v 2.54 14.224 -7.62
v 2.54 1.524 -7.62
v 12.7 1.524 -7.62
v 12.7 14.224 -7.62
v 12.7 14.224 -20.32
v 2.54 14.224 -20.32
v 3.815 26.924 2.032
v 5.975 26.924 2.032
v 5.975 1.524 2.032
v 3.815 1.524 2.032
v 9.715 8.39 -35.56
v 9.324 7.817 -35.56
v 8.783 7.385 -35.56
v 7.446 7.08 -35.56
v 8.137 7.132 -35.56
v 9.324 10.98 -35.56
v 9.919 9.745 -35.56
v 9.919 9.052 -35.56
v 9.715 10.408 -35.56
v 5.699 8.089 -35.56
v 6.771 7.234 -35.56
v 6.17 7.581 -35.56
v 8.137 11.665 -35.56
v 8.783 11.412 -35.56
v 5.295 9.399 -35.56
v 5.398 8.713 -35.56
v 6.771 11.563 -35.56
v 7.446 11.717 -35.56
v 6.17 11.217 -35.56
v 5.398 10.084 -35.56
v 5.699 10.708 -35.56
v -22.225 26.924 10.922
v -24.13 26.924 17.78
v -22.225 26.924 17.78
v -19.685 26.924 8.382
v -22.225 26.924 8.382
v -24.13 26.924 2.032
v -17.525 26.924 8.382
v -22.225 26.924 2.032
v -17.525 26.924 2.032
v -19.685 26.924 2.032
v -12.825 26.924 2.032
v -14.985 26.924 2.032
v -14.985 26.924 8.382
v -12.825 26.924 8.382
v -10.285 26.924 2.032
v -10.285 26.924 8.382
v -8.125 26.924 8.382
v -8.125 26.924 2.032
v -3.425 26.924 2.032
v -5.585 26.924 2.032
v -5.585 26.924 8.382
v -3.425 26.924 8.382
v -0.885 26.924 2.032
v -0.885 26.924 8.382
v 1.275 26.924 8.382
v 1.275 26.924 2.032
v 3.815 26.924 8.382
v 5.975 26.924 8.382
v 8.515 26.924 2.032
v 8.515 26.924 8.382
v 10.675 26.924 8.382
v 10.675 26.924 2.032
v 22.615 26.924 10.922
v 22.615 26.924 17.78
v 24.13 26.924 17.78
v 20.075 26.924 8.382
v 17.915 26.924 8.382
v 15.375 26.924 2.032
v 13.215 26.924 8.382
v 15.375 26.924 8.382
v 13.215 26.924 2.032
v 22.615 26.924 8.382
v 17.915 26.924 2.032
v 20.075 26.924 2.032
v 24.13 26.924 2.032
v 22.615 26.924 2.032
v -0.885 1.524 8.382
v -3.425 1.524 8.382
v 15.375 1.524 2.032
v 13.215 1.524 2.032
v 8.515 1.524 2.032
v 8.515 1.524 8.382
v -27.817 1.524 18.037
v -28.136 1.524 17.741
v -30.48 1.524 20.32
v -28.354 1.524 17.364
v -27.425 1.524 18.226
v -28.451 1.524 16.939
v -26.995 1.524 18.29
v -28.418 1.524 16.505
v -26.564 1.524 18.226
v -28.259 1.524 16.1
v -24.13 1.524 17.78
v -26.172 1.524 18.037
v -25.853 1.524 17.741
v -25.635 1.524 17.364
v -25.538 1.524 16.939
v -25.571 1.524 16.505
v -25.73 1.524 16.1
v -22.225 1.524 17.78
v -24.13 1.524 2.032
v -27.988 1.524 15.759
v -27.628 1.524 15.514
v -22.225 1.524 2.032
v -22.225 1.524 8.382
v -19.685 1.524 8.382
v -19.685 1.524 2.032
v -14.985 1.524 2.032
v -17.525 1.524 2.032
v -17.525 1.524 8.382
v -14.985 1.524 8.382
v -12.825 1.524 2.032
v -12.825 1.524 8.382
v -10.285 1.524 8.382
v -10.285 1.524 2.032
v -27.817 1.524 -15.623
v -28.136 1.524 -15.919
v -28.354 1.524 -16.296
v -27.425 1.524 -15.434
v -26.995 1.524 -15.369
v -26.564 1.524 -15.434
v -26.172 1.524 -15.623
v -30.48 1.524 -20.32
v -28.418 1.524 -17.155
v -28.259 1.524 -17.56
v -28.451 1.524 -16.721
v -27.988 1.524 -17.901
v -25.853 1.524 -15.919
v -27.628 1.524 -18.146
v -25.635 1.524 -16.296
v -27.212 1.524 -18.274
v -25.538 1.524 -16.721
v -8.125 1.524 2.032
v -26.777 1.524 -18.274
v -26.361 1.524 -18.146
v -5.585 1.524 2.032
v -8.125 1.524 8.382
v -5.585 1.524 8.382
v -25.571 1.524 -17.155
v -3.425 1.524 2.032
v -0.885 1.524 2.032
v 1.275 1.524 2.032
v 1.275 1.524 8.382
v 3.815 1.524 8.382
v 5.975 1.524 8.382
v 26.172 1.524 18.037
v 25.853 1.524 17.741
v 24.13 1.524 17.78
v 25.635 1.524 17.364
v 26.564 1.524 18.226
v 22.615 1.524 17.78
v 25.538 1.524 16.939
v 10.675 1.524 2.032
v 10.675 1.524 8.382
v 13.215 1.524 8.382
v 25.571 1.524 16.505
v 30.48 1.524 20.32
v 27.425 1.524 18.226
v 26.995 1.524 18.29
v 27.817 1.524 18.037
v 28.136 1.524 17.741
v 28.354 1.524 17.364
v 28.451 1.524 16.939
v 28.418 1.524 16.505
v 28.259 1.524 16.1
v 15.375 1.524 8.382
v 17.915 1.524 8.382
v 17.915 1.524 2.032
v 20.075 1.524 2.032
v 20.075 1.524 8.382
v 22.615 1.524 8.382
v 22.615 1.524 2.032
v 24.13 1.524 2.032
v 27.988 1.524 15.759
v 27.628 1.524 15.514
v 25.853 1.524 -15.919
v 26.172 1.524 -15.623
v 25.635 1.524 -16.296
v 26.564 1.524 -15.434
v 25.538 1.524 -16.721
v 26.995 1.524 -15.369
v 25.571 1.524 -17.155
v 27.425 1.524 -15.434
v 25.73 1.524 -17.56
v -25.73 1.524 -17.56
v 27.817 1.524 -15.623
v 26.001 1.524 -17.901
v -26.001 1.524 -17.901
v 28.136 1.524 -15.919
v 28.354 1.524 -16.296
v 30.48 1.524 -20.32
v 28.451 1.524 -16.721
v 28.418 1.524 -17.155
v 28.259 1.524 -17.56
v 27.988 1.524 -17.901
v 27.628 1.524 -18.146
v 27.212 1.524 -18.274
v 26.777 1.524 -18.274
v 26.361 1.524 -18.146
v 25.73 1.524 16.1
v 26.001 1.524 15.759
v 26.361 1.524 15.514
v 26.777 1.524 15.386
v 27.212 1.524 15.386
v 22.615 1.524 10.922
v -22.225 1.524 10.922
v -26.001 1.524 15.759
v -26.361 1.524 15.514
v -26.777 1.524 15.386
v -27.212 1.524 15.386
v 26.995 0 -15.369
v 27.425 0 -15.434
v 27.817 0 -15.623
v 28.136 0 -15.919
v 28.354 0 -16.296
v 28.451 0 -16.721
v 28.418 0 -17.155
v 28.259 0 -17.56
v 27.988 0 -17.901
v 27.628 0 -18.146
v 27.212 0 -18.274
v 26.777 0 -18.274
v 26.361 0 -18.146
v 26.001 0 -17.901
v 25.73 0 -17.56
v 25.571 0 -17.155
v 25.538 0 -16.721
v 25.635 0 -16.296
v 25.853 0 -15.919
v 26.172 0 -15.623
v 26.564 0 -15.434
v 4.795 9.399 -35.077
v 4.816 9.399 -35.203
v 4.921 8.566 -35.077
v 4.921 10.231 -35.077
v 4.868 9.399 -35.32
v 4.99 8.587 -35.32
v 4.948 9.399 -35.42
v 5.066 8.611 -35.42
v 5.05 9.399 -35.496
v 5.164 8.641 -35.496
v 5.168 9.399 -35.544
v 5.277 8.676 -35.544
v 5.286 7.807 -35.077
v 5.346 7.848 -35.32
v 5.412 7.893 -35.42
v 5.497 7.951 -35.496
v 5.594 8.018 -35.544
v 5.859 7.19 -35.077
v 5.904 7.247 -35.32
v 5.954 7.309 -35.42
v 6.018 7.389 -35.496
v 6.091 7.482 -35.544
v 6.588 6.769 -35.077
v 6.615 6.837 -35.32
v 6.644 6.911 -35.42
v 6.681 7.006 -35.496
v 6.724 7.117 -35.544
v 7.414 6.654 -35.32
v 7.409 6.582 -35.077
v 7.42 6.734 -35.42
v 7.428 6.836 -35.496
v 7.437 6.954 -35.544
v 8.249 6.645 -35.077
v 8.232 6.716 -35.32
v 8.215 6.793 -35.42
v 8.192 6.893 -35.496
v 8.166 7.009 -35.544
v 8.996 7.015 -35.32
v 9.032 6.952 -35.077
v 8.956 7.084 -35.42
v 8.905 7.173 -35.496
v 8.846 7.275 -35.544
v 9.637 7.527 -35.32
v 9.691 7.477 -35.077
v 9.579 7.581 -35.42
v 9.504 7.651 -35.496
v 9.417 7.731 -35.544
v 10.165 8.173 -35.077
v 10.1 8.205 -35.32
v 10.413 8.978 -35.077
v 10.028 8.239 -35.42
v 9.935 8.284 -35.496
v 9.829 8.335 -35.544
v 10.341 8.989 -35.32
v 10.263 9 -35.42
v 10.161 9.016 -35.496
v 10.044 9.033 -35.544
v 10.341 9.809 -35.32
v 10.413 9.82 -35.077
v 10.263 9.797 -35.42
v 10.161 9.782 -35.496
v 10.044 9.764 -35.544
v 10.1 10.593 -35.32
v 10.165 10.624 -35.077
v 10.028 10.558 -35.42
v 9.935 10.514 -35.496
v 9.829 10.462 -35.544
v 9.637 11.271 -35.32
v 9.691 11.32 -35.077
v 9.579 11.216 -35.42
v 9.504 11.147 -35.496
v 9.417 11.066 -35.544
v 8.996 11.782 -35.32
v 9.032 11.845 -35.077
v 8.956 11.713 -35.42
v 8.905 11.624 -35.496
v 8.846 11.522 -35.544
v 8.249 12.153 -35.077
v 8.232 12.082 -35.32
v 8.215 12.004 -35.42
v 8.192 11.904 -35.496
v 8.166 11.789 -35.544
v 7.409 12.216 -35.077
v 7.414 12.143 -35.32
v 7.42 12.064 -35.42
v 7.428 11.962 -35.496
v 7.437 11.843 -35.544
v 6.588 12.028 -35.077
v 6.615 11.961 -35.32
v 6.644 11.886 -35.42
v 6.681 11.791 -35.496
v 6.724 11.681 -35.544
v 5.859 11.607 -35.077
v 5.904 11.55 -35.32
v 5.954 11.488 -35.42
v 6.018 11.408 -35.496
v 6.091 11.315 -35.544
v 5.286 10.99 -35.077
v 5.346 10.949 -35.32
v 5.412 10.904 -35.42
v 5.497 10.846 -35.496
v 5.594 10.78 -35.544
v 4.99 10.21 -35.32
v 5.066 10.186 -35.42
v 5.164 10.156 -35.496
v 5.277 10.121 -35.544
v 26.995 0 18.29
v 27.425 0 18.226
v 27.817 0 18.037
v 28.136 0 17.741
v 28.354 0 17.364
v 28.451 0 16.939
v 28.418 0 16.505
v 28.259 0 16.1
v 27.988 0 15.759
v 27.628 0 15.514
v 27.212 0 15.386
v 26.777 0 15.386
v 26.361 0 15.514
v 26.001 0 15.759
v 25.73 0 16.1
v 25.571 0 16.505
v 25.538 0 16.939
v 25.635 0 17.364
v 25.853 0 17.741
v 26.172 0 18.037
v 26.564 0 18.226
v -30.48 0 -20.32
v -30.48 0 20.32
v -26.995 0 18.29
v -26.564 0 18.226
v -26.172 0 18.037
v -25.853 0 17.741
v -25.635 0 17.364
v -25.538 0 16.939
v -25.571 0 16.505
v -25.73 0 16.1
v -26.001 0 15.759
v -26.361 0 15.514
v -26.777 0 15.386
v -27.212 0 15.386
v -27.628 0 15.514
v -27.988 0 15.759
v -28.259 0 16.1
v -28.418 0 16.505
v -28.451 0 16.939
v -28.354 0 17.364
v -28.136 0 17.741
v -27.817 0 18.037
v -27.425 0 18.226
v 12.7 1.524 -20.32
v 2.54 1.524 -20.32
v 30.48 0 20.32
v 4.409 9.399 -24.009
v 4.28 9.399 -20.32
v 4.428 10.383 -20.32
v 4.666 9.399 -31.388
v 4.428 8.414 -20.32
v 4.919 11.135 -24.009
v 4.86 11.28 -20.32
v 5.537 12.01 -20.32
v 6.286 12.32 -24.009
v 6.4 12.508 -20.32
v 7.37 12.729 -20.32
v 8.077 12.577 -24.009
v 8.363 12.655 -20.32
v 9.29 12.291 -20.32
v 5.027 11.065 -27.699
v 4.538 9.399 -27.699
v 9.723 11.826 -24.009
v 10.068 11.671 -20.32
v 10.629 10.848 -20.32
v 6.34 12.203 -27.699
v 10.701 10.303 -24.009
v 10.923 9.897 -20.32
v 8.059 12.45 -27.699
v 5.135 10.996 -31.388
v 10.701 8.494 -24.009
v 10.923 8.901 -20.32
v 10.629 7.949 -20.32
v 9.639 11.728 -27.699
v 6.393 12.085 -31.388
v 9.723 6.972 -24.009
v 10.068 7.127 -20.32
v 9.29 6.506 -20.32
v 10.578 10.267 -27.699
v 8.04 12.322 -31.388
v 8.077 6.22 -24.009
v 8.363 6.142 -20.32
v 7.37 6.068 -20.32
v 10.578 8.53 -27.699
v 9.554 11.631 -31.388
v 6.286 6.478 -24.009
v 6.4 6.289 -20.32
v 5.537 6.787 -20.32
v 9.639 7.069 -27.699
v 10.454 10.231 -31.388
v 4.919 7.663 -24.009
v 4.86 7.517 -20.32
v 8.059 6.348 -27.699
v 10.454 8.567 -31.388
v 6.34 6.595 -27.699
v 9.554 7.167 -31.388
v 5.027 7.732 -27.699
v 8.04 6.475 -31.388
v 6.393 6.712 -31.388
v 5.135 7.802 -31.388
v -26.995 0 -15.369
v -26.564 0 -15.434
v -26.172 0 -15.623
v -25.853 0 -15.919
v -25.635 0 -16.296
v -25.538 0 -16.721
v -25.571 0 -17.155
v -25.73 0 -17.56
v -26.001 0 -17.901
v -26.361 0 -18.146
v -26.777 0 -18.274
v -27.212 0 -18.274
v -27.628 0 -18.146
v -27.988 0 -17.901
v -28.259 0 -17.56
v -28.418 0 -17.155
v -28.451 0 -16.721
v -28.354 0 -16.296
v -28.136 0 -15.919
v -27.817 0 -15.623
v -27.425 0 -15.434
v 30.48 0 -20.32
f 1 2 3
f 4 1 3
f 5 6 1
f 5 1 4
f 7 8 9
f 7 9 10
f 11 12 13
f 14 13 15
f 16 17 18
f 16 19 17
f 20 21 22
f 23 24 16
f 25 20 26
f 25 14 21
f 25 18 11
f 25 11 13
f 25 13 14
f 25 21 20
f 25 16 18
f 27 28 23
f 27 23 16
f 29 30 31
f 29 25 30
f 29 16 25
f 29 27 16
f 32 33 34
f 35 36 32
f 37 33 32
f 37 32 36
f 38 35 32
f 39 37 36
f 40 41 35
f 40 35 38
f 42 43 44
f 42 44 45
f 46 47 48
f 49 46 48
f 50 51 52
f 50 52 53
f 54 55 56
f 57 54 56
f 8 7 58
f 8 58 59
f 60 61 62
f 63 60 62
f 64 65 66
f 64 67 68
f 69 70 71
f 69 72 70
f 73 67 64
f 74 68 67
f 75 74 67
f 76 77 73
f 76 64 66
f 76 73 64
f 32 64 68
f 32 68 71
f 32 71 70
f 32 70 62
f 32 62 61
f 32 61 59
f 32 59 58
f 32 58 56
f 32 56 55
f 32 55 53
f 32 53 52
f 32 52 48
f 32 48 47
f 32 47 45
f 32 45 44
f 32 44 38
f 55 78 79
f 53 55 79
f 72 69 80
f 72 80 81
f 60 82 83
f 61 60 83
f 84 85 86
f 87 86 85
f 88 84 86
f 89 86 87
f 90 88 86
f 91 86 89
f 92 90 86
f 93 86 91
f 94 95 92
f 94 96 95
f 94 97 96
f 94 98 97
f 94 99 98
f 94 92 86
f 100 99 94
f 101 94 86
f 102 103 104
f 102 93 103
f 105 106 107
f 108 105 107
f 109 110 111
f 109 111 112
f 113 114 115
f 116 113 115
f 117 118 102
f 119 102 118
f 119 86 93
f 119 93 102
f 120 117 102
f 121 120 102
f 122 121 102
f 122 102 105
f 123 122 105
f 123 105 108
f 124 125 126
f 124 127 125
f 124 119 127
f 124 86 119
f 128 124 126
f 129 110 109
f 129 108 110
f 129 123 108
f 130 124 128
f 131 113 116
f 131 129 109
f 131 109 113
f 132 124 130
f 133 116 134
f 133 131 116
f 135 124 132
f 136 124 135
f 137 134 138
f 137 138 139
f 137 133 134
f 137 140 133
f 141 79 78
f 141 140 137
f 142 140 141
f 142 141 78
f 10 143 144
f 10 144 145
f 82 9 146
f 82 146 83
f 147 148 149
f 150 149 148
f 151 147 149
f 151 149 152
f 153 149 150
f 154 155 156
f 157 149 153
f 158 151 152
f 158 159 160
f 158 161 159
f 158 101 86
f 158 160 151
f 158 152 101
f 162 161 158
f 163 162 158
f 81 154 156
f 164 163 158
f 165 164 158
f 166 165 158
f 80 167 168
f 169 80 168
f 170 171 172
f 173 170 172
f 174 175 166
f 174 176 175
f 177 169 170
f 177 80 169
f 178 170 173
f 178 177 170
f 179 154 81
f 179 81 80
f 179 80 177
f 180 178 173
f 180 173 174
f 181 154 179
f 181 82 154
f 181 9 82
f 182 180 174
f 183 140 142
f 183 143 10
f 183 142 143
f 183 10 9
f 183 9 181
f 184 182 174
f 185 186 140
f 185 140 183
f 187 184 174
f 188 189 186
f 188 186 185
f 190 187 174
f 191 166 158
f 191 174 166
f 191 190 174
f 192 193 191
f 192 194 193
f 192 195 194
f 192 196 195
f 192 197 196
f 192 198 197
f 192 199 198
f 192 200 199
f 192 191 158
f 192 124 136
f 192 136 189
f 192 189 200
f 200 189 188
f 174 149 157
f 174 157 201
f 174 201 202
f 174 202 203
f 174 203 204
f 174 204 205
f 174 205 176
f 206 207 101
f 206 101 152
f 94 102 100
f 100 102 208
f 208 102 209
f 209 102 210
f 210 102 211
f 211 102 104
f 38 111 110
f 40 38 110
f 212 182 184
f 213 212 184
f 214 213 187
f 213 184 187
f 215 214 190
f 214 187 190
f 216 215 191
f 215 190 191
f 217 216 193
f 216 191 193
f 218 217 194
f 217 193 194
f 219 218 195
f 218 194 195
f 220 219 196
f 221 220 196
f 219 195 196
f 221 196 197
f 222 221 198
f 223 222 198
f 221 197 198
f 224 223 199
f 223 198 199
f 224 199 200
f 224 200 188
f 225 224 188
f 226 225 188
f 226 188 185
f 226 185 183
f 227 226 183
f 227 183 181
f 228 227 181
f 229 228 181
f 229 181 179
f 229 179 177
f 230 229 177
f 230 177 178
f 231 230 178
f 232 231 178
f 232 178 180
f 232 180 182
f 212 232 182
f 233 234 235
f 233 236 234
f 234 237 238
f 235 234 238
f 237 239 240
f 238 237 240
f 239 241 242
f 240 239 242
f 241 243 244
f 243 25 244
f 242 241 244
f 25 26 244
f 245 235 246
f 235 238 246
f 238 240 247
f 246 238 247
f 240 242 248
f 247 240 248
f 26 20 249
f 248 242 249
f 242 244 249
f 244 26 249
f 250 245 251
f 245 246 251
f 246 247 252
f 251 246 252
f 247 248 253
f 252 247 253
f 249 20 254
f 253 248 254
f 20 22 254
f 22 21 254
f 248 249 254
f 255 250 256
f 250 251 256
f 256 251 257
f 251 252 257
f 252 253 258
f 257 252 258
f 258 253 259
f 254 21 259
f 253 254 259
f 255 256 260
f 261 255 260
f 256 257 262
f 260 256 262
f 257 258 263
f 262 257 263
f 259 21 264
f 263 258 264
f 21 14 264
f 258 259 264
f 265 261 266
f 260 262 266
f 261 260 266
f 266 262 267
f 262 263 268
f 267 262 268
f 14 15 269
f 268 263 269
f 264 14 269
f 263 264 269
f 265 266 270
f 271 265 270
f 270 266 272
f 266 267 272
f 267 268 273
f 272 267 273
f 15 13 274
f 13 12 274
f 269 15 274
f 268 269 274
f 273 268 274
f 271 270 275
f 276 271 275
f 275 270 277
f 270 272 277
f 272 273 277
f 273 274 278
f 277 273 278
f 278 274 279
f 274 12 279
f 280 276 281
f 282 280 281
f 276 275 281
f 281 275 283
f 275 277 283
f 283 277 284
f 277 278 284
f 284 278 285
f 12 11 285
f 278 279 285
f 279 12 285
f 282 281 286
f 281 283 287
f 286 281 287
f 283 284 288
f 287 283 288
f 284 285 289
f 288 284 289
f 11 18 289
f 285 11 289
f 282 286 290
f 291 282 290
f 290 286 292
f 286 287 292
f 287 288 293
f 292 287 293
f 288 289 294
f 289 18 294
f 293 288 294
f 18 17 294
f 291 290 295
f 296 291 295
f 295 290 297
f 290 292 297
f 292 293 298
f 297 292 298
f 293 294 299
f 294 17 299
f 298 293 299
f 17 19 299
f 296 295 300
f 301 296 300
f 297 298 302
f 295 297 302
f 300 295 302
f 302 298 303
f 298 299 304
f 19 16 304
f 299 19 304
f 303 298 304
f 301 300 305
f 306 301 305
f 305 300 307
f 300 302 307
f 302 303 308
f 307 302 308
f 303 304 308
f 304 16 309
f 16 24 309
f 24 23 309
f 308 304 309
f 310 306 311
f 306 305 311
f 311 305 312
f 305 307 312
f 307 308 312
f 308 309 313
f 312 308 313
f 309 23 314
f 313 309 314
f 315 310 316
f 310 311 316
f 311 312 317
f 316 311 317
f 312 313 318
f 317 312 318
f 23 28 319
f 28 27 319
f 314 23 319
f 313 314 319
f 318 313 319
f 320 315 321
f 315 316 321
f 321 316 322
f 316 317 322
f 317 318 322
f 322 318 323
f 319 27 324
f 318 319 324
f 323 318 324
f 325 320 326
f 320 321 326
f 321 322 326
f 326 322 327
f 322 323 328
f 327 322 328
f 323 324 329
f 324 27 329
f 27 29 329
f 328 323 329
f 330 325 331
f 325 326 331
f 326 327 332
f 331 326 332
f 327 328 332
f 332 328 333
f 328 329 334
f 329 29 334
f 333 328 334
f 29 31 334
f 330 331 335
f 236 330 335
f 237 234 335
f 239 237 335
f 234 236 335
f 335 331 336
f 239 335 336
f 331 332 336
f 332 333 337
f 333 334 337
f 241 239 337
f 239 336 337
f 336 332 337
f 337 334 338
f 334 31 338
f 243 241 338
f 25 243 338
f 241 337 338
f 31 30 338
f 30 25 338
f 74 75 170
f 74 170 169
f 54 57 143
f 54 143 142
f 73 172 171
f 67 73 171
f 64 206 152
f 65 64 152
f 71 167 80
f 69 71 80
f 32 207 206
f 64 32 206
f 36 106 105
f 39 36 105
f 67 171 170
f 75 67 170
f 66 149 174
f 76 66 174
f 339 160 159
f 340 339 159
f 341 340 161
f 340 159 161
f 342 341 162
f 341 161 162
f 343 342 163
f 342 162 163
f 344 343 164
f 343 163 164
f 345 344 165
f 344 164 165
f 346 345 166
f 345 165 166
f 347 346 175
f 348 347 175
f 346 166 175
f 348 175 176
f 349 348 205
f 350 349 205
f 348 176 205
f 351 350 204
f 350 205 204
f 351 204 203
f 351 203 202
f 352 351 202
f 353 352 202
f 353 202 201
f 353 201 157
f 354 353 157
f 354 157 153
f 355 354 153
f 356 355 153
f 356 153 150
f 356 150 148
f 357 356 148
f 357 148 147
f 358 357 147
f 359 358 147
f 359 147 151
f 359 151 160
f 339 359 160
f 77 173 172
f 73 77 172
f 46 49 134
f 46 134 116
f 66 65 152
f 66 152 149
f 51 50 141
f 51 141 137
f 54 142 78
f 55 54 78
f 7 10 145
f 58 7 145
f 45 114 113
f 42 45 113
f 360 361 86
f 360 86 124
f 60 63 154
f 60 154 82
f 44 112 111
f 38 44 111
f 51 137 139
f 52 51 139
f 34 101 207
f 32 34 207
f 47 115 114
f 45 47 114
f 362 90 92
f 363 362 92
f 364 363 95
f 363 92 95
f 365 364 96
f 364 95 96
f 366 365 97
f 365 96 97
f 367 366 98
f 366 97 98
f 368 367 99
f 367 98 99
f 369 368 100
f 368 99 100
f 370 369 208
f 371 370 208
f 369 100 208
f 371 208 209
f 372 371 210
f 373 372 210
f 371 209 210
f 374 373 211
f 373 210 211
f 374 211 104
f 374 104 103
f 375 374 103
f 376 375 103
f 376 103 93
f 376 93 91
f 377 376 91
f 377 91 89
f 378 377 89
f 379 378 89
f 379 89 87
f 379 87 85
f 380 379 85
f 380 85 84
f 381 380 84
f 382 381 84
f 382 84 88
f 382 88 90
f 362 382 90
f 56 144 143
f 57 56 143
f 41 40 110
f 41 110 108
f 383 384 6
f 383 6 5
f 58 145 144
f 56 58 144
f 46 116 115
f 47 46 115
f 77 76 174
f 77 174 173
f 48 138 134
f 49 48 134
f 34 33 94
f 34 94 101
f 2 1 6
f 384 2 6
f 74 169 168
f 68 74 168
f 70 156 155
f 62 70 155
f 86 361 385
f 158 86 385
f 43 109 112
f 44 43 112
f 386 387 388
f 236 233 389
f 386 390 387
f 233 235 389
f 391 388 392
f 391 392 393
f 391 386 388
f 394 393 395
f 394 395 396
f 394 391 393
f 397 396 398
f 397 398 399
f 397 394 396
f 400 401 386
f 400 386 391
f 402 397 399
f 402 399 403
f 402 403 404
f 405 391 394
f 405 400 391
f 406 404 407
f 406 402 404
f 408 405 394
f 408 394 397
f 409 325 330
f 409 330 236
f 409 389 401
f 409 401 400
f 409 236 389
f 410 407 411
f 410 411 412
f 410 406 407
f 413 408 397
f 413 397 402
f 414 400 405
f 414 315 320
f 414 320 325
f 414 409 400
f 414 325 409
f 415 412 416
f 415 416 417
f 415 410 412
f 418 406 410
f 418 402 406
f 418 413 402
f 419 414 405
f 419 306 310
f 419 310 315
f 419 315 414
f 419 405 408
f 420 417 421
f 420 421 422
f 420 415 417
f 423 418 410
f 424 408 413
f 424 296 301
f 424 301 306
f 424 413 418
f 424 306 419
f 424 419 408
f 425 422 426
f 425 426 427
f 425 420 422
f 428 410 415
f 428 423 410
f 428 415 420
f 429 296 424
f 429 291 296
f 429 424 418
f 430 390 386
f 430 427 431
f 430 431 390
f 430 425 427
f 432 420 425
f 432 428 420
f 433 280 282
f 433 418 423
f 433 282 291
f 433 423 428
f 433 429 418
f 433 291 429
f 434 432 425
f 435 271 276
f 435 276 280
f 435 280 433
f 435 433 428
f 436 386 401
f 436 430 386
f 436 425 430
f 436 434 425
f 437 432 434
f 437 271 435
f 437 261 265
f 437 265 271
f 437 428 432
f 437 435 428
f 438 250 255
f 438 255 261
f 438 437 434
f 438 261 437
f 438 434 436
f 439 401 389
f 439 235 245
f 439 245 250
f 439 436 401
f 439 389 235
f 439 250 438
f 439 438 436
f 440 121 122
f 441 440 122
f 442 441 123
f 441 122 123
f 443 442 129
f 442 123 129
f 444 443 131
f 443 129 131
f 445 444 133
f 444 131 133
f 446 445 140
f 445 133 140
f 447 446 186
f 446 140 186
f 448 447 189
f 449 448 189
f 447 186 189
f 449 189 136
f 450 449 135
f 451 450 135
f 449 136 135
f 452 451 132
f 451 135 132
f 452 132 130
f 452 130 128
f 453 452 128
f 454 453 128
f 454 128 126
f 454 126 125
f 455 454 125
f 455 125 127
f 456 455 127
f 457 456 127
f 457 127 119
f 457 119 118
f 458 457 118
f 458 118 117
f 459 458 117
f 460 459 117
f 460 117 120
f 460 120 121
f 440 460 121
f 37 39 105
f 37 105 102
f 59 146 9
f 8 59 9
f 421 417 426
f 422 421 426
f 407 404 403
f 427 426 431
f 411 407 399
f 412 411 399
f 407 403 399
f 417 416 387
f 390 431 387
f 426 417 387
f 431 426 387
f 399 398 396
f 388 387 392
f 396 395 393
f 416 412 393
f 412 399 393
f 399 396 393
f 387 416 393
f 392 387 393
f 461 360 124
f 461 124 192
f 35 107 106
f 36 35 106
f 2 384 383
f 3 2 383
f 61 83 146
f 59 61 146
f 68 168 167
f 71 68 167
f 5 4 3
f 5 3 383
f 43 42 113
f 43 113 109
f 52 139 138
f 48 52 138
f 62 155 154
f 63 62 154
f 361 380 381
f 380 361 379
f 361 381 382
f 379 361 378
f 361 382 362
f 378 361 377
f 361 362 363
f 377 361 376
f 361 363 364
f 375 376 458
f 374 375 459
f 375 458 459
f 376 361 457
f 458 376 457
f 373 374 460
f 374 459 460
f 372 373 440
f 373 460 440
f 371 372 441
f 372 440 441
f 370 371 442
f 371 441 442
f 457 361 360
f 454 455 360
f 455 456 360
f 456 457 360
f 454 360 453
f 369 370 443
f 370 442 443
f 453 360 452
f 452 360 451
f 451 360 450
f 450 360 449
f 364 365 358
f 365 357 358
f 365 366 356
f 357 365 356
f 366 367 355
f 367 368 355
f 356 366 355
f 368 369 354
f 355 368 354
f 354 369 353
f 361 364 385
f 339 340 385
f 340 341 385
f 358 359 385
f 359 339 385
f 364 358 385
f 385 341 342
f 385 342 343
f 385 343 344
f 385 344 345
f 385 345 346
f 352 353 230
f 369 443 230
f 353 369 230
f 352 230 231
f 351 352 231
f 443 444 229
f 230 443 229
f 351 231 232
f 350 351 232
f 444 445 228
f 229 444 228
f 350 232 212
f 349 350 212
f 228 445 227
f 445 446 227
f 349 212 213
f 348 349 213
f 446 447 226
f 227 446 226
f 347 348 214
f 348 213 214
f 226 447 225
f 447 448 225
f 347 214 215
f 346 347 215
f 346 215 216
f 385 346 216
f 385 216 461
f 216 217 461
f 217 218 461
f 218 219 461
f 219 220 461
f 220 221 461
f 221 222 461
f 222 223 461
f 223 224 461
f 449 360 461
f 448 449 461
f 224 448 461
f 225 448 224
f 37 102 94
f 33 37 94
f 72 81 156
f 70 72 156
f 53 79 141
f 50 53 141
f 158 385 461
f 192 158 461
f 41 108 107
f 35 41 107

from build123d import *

# Parameters (mm, degrees)
SKETCH1_W           = 60.96
SKETCH1_H           = 40.64
BOSS_EXTRUDE1_DEPTH = 1.524
BOSS_EXTRUDE2_DEPTH = 25.4
SKETCH3_R           = 1.4605
CUT_EXTRUDE1_DEPTH  = 45.576819088
SKETCH4_W           = 10.16
SKETCH4_H           = 12.7
BOSS_EXTRUDE3_DEPTH = 12.7
SKETCH5_R           = 3.3401
BOSS_EXTRUDE4_DEPTH = 15.24
BOSS_EXTRUDE4_TAPER = 2
FILLET1_R           = 0.5


with BuildPart() as part:
    # Sketch1 → Boss-Extrude1 (new body)
    with BuildSketch(Plane(origin=(0, 0, 0), x_dir=(1, 0, 0), z_dir=(0, 1, 0))):
        Rectangle(SKETCH1_W, SKETCH1_H)
    extrude(amount=BOSS_EXTRUDE1_DEPTH)

    # Sketch2 → Boss-Extrude2 (add)
    with BuildSketch(Plane(origin=(0, 1.524, 0), x_dir=(1, 0, 0), z_dir=(0, 1, 0))):
        Polygon((-14.985, -2.032), (-14.985, -8.382), (-17.525, -8.382), (-17.525, -2.032), (-19.685, -2.032), (-19.685, -8.382), (-22.225, -8.382), (-22.225, -2.032), (-24.13, -2.032), (-24.13, -17.78), (-22.225, -17.78), (-22.225, -10.922), (22.615, -10.922), (22.615, -17.78), (24.13, -17.78), (24.13, -2.032), (22.615, -2.032), (22.615, -8.382), (20.075, -8.382), (20.075, -2.032), (17.915, -2.032), (17.915, -8.382), (15.375, -8.382), (15.375, -2.032), (13.215, -2.032), (13.215, -8.382), (10.675, -8.382), (10.675, -2.032), (8.515, -2.032), (8.515, -8.382), (5.975, -8.382), (5.975, -2.032), (3.815, -2.032), (3.815, -8.382), (1.275, -8.382), (1.275, -2.032), (-0.885, -2.032), (-0.885, -8.382), (-3.425, -8.382), (-3.425, -2.032), (-5.585, -2.032), (-5.585, -8.382), (-8.125, -8.382), (-8.125, -2.032), (-10.285, -2.032), (-10.285, -8.382), (-12.825, -8.382), (-12.825, -2.032), align=None)
    extrude(amount=BOSS_EXTRUDE2_DEPTH)

    # Sketch3 → Cut-Extrude1 (cut, through all)
    with BuildSketch(Plane(origin=(0, 1.524, 0), x_dir=(1, 0, 0), z_dir=(0, 1, 0))):
        with Locations(Location((-26.994541112, 16.83, 0), (0, 0, 270))):
            Circle(SKETCH3_R)
        with Locations(Location((26.994541112, 16.83, 0), (0, 0, 270))):
            Circle(SKETCH3_R)
        with Locations(Location((26.994541112, -16.83, 0), (0, 0, 270))):
            Circle(SKETCH3_R)
        with Locations(Location((-26.994541112, -16.83, 0), (0, 0, 270))):
            Circle(SKETCH3_R)
    extrude(amount=-CUT_EXTRUDE1_DEPTH, mode=Mode.SUBTRACT)


with BuildPart() as body_2:
    # Sketch4 → Boss-Extrude3 (new body)
    with BuildSketch(Plane(origin=(0, 1.524, 0), x_dir=(1, 0, 0), z_dir=(0, 1, 0))):
        with Locations((7.62, 13.97)):
            Rectangle(SKETCH4_W, SKETCH4_H)
    extrude(amount=BOSS_EXTRUDE3_DEPTH)


with BuildPart() as body_3:
    # Sketch5 → Boss-Extrude4 (new body)
    with BuildSketch(Plane(origin=(0, 0, -20.32), x_dir=(-1, 0, 0), z_dir=(0, 0, -1))):
        with Locations((-7.62, 9.398694036)):
            Circle(SKETCH5_R)
    extrude(amount=BOSS_EXTRUDE4_DEPTH, taper=BOSS_EXTRUDE4_TAPER)

    # Fillet1
    fillet1_edges = [body_3.edges().sort_by_distance(p)[0] for p in [
        (10.427907473, 9.398694036, -35.56),
    ]]
    fillet(fillet1_edges, radius=FILLET1_R)


solid = Compound([part.part, body_2.part, body_3.part])
